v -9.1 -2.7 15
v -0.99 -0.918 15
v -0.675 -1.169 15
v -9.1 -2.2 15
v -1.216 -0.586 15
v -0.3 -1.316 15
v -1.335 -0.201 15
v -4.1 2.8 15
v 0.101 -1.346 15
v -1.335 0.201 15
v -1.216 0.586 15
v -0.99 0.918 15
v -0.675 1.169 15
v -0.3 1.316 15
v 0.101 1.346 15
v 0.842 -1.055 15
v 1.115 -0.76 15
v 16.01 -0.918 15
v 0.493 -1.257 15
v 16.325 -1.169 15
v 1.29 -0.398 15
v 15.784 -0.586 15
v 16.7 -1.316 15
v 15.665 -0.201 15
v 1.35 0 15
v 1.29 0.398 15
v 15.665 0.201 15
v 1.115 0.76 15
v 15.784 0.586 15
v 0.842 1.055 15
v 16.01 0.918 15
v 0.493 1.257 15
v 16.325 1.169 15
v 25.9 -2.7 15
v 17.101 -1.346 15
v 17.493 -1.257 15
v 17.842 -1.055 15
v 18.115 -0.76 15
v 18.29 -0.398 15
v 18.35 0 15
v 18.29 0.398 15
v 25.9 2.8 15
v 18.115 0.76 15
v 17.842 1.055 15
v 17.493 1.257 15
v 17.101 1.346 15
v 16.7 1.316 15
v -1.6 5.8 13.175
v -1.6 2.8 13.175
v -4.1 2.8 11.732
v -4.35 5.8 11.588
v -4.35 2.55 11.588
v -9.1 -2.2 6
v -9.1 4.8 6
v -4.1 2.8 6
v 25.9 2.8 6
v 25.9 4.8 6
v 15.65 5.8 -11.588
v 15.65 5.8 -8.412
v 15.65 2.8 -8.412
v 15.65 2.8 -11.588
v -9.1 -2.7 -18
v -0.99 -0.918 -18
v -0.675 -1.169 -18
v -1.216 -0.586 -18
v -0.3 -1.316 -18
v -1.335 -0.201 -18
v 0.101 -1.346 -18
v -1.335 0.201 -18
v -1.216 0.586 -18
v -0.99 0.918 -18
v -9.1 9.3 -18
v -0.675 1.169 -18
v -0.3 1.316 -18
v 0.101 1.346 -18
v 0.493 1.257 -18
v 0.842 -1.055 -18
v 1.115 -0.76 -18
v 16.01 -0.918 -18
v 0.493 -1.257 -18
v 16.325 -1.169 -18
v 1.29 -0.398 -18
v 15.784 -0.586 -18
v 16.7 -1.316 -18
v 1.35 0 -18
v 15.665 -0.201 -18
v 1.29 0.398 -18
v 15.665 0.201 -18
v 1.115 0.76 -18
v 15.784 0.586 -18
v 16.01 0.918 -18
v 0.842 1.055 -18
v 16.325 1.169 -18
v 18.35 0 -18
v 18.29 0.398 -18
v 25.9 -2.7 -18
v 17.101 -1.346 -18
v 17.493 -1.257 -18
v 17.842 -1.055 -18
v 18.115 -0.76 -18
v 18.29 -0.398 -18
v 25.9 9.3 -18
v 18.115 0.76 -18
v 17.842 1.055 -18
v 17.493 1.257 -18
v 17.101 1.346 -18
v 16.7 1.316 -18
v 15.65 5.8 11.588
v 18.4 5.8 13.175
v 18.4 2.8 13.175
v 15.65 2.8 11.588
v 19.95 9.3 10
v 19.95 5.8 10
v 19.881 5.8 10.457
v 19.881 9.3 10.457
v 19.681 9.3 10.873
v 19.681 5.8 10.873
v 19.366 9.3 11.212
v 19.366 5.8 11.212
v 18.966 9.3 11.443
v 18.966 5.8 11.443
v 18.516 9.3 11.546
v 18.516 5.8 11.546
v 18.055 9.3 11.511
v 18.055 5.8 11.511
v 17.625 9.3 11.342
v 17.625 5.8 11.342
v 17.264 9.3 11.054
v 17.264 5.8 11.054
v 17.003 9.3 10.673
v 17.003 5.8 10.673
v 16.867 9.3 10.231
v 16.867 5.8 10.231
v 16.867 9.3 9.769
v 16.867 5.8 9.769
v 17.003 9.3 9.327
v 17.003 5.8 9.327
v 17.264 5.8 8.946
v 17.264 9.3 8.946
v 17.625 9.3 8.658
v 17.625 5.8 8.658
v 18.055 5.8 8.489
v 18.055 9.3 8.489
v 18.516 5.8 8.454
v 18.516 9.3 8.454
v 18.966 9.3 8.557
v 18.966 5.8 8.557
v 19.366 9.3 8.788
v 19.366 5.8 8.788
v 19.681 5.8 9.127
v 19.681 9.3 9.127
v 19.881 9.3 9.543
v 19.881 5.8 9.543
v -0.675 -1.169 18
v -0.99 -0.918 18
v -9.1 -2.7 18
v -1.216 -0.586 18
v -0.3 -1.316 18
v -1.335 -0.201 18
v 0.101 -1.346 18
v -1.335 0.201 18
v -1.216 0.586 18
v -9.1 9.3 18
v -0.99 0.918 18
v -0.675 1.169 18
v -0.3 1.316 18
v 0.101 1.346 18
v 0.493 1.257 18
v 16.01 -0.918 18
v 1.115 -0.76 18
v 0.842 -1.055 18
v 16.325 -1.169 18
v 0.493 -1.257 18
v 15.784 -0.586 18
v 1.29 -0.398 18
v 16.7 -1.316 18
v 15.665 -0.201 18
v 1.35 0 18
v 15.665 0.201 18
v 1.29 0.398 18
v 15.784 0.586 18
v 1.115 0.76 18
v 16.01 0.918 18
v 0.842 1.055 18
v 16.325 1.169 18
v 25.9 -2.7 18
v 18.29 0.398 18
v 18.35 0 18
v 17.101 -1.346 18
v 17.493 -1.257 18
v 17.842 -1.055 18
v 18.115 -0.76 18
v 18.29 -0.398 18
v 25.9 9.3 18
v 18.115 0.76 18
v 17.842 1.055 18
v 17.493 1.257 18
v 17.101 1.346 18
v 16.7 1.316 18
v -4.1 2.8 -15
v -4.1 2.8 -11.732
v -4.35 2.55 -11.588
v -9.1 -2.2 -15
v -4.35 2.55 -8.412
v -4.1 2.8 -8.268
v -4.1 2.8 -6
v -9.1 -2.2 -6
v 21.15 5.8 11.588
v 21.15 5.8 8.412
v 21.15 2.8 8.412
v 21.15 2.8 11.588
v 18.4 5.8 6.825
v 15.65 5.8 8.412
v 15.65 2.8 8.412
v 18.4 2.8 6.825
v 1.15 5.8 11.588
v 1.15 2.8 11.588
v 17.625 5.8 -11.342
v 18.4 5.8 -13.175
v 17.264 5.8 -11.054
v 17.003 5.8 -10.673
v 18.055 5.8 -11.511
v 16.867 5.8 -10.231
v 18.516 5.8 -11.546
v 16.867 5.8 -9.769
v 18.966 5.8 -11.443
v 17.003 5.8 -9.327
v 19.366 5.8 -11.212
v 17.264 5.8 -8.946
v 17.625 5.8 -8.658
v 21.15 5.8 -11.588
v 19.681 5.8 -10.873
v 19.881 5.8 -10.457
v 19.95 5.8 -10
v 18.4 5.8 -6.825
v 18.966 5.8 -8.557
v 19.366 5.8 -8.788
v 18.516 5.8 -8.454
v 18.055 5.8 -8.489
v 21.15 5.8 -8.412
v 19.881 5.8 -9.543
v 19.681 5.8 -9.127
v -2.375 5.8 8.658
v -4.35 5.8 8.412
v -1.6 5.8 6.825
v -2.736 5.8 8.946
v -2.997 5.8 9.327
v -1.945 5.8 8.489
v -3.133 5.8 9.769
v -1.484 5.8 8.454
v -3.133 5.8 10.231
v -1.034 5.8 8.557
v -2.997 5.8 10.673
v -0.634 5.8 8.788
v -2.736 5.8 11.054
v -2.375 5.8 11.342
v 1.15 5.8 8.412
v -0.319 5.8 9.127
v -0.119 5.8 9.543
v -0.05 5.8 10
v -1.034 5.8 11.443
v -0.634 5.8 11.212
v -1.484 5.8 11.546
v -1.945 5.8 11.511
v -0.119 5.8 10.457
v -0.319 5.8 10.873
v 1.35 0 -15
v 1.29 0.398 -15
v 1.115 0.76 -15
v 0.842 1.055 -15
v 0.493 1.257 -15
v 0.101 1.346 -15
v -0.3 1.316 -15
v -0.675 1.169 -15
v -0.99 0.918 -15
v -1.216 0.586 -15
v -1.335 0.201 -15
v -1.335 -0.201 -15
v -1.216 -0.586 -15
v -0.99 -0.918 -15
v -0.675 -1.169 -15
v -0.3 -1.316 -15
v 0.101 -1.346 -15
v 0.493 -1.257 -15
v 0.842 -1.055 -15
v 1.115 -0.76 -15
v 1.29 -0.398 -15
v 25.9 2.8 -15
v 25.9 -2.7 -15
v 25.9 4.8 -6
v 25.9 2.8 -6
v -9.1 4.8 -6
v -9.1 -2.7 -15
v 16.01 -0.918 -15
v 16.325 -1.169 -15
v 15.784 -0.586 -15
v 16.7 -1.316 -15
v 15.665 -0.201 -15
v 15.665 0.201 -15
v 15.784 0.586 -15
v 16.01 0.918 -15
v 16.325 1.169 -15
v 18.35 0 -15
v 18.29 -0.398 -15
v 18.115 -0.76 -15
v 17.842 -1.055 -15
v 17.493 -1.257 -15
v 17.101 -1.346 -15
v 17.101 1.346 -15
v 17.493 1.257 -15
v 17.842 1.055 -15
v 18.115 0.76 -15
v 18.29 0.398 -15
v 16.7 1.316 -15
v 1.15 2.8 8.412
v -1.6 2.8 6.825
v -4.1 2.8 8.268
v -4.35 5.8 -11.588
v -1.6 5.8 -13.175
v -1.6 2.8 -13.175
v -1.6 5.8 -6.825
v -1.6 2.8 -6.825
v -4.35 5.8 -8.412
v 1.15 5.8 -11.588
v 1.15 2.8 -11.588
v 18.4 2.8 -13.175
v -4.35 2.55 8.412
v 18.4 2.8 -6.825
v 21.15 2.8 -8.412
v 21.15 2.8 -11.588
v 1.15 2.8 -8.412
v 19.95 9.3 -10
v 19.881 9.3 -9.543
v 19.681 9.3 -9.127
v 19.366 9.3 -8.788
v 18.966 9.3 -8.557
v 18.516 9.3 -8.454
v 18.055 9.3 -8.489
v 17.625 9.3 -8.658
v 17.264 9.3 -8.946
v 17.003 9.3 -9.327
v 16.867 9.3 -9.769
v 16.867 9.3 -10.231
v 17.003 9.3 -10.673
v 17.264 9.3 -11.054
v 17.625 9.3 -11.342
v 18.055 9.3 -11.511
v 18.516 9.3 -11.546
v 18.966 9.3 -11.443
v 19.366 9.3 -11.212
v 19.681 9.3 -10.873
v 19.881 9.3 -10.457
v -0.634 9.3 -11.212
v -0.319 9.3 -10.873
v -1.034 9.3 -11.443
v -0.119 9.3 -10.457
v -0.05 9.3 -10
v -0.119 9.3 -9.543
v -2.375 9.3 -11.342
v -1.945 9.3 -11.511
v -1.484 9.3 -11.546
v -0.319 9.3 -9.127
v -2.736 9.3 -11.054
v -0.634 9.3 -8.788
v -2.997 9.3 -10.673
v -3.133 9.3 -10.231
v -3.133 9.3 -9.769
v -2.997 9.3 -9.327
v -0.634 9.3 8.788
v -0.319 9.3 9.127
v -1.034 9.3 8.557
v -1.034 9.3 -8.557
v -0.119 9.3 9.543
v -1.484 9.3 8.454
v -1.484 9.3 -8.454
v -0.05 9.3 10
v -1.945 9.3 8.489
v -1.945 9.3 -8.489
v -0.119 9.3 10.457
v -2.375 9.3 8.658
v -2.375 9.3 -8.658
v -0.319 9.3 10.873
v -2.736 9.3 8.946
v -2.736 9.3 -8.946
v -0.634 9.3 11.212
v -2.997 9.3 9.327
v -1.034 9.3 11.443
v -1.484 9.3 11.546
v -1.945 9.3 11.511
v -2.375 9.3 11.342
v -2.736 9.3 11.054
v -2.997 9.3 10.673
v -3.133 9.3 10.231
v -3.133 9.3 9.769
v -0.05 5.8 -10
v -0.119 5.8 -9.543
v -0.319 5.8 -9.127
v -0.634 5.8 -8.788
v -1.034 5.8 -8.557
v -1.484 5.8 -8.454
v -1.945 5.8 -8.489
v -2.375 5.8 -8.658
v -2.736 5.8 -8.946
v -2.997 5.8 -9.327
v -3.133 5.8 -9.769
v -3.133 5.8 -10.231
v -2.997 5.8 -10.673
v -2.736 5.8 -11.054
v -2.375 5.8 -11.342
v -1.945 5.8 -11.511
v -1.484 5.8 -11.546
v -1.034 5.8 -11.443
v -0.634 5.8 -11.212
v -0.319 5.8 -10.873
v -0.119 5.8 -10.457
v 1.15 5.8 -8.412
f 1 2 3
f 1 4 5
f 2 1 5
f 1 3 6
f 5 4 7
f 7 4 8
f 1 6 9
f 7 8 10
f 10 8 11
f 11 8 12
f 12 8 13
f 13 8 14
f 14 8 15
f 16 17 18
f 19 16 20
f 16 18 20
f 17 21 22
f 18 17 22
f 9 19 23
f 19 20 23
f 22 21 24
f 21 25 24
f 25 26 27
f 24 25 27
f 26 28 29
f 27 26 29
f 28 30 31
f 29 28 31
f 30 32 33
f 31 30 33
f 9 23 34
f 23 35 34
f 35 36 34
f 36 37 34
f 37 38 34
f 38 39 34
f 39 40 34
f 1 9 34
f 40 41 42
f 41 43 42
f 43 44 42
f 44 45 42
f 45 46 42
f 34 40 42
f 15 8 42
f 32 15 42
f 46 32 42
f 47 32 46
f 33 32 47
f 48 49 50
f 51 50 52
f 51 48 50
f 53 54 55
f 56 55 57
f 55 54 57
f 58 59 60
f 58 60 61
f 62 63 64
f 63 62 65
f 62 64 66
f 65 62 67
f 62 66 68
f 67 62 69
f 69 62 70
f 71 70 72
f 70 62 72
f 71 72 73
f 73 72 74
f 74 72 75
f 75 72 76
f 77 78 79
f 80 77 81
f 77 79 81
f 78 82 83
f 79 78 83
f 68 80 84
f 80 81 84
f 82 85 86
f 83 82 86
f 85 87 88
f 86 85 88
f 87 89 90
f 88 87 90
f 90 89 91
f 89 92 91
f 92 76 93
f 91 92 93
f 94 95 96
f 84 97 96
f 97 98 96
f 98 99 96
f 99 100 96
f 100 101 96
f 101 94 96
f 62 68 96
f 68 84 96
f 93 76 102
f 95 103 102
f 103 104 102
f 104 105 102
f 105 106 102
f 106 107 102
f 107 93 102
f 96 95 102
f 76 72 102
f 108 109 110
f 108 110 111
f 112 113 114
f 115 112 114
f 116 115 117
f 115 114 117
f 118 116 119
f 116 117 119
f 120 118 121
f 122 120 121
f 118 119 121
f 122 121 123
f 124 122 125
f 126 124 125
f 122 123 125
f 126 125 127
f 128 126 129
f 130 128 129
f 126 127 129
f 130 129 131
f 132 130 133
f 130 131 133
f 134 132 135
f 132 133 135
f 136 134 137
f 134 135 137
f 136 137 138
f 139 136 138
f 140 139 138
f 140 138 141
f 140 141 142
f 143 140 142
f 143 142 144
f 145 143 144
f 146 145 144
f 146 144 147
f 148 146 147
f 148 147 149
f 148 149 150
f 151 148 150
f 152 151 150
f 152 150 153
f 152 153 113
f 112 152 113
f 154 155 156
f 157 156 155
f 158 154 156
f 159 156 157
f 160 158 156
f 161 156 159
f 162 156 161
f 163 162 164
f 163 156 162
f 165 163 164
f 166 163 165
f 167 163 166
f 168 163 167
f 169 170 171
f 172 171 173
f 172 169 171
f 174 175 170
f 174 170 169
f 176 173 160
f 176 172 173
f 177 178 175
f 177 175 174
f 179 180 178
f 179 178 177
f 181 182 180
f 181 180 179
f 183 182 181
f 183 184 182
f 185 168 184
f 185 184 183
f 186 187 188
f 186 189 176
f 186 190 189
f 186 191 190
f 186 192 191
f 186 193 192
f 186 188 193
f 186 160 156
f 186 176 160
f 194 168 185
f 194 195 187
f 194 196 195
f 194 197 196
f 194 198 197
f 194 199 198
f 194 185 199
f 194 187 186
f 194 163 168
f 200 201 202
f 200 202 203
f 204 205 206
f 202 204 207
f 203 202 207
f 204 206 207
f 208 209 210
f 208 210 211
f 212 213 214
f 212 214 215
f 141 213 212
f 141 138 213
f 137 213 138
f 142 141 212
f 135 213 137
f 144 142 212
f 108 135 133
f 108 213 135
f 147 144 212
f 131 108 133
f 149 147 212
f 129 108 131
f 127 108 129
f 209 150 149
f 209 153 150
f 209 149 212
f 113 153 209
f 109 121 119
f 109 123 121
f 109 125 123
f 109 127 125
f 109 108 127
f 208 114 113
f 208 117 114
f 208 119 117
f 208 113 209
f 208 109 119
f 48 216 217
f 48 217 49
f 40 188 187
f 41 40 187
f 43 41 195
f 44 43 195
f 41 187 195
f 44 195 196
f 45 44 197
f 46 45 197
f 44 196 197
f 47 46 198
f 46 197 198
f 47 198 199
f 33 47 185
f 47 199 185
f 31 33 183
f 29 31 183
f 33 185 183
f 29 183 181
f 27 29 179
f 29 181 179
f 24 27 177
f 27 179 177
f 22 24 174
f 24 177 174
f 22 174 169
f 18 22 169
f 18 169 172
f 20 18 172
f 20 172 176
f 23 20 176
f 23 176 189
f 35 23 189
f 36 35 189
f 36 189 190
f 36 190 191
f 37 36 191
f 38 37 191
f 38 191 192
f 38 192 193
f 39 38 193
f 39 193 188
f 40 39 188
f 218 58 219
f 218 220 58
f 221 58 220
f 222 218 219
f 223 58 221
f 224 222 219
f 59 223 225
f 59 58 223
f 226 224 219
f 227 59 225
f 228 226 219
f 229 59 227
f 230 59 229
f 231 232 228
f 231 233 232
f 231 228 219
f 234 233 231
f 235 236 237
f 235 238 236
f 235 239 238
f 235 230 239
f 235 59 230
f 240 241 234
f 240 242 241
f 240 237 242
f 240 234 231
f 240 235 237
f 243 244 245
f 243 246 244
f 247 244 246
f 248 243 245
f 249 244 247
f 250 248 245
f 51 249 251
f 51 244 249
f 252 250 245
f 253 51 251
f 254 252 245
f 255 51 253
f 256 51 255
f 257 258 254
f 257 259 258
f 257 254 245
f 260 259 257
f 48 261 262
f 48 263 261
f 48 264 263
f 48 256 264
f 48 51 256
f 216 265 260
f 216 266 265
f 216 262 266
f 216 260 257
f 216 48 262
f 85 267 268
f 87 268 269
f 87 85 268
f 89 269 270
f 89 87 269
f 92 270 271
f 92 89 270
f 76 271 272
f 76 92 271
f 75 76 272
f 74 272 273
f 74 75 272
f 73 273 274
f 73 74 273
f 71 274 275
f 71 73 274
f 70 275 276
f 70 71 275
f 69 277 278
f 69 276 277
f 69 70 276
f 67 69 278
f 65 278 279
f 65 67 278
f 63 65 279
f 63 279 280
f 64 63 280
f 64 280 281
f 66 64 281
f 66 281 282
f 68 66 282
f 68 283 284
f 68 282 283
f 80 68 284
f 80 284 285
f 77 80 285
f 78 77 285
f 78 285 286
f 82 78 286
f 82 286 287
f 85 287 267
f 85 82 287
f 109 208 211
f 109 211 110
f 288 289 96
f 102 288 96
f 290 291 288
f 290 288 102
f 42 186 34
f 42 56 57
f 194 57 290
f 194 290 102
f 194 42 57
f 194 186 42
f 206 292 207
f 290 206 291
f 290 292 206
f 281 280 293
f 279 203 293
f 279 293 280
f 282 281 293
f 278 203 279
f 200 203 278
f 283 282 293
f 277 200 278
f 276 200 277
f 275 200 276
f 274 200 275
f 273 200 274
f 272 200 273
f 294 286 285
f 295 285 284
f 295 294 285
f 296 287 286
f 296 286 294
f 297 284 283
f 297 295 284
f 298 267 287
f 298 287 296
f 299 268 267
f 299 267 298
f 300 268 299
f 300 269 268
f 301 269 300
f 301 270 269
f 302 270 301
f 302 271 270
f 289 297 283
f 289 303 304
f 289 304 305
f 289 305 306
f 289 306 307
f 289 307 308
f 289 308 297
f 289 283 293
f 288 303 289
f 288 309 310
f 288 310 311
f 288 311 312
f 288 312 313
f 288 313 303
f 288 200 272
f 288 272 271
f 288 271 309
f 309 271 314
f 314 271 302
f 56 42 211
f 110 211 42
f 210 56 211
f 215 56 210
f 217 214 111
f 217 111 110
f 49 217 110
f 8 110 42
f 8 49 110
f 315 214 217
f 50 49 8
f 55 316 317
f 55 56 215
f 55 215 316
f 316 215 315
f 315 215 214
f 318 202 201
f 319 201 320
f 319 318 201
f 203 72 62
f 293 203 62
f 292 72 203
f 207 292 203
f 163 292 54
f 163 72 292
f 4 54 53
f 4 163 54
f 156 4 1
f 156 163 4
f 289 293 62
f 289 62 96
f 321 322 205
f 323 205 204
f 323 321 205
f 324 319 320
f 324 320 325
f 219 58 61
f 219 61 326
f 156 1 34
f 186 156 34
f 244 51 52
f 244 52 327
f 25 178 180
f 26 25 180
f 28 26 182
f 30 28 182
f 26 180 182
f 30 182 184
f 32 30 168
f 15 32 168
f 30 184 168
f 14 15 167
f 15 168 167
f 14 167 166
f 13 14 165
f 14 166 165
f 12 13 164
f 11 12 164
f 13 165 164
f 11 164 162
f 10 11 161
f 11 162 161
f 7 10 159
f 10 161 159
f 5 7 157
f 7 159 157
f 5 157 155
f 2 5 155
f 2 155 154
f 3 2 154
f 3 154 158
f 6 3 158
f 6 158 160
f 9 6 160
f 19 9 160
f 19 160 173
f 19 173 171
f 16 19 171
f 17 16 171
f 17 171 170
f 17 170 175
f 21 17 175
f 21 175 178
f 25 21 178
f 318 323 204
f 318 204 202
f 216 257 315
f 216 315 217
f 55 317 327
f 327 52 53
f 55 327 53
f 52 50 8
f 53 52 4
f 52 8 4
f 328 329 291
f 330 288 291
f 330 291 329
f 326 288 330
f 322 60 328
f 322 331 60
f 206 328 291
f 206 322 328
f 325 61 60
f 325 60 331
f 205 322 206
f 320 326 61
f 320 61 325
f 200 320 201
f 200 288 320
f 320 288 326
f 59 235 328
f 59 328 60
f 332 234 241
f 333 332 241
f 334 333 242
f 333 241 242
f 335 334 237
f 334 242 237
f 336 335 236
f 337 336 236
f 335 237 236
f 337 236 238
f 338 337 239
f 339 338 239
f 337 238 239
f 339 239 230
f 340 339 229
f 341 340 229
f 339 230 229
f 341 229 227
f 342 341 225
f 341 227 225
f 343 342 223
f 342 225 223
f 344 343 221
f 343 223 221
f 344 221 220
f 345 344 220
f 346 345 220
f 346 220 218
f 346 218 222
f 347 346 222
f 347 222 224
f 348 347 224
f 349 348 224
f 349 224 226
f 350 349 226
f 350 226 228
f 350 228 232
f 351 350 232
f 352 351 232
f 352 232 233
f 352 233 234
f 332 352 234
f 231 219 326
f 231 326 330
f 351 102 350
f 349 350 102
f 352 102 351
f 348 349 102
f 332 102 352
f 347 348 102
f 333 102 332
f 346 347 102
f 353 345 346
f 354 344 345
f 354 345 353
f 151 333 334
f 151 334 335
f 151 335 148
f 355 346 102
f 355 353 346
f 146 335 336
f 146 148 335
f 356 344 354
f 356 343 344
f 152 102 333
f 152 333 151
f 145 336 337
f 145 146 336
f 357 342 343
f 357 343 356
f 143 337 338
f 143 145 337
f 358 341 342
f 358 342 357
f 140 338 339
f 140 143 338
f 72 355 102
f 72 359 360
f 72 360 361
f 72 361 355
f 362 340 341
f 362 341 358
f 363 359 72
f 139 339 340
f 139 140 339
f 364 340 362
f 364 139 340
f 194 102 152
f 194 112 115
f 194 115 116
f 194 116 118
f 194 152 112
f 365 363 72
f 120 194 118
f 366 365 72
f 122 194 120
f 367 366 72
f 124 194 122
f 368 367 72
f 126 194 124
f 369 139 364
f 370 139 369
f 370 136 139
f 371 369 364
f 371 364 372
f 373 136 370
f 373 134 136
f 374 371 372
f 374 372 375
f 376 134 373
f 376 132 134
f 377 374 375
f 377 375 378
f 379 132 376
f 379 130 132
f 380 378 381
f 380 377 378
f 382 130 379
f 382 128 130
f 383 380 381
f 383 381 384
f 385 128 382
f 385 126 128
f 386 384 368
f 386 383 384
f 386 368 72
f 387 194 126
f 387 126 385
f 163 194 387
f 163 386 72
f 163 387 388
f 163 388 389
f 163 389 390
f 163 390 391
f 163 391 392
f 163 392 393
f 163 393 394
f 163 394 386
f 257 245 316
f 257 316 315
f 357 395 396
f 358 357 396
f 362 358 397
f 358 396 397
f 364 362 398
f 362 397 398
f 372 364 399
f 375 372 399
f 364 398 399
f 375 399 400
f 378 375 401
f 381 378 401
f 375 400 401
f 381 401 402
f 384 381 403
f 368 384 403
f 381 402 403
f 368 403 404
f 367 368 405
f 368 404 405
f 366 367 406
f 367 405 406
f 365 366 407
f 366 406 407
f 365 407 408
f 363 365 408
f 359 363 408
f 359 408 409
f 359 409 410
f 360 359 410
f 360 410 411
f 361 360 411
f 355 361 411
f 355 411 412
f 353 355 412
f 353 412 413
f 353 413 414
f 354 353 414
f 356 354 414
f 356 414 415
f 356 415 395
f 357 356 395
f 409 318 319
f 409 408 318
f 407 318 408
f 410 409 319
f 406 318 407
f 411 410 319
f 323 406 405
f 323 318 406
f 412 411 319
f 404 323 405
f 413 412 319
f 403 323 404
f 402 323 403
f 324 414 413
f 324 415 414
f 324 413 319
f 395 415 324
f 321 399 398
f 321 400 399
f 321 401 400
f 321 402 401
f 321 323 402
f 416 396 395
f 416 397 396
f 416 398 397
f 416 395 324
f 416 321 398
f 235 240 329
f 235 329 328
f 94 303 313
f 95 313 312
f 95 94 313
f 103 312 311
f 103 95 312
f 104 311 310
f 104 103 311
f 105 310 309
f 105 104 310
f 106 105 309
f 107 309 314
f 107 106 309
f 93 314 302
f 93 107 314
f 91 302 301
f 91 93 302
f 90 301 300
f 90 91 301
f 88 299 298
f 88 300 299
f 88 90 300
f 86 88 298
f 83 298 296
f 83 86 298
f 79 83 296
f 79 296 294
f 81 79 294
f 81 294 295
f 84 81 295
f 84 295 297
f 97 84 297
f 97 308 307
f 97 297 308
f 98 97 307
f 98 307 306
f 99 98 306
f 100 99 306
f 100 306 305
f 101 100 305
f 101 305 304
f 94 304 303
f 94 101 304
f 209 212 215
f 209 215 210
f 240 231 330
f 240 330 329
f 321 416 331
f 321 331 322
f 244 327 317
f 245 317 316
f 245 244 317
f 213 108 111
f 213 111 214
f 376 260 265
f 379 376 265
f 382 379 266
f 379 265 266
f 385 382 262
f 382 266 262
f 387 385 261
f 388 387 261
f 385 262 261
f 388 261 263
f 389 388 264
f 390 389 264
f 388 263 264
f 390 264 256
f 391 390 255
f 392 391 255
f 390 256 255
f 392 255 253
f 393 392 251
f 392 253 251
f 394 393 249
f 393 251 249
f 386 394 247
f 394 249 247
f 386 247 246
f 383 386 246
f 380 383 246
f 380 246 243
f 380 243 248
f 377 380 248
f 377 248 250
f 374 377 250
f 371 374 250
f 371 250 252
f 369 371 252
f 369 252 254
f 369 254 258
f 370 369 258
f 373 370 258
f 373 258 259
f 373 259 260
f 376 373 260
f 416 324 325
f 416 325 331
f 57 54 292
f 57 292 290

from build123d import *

# Parameters (mm, degrees)
BOSS_EXTRUDE1_DEPTH        = 18
CROQUIS2_R                 = 1.35
CORTAR_EXTRUIR2_DEPTH      = 5
CORTAR_EXTRUIR3_START      = 3
CORTAR_EXTRUIR3_DEPTH      = 17
CORTAR_EXTRUIR4_DEPTH      = 33.203415968
CORTAR_EXTRUIR4_DEPTH_BACK = 2
CROQUIS4_W                 = 70
CROQUIS4_H                 = 12
CORTAR_EXTRUIR5_DEPTH      = 2.5
CORTAR_EXTRUIR5_DEPTH_BACK = 3
CROQUIS7_R                 = 0.161098749
CROQUIS7_R_2               = 1.55
CORTAR_EXTRUIR6_DEPTH      = 33.203415968


with BuildPart() as part:
    # Sketch1 → Boss-Extrude1 (new body)
    with BuildSketch(Plane.XY):
        Polygon((25.9, 9.3), (-9.1, 9.3), (-9.1, 2.5), (-9.1, -2.7), (25.9, -2.7), (25.9, 2.5), align=None)
    boss_extrude1 = extrude(amount=BOSS_EXTRUDE1_DEPTH)

    # Croquis2 → Cortar-Extruir2 (cut)
    with BuildSketch(Plane.XY.offset(18)):
        Circle(CROQUIS2_R)
        with Locations((17, 0)):
            Circle(CROQUIS2_R)
    cortar_extruir2 = extrude(amount=-CORTAR_EXTRUIR2_DEPTH, mode=Mode.SUBTRACT)

    # Croquis3 → Cortar-Extruir3 (cut)
    with BuildSketch(Plane(origin=(0, 0, 18), x_dir=(-1, 0, 0), z_dir=(0, 0, -1)).offset(CORTAR_EXTRUIR3_START)):
        Polygon((-25.9, -2.7), (-25.9, 2.8), (4.1, 2.8), (9.1, -2.2), (9.1, -2.7), align=None)
    cortar_extruir3 = extrude(amount=CORTAR_EXTRUIR3_DEPTH, mode=Mode.SUBTRACT)

    # Mirror1: Boss-Extrude1, Cortar-Extruir2, Cortar-Extruir3 across plane
    add(boss_extrude1.mirror(Plane.XY))
    add(cortar_extruir2.mirror(Plane.XY), mode=Mode.SUBTRACT)
    add(cortar_extruir3.mirror(Plane.XY), mode=Mode.SUBTRACT)

    # Croquis4 → Cortar-Extruir4 (cut, two sides: drawn at the far end of the back side and taken through both)
    with BuildSketch(Plane.XZ.offset(-2.8).offset(-CORTAR_EXTRUIR4_DEPTH_BACK)):
        with Locations((-9.1, 0)):
            Rectangle(CROQUIS4_W, CROQUIS4_H)
    extrude(amount=CORTAR_EXTRUIR4_DEPTH + CORTAR_EXTRUIR4_DEPTH_BACK, mode=Mode.SUBTRACT)

    # Croquis5 → Cortar-Extruir5 (cut, two sides: drawn at the far end of the back side and taken through both)
    with BuildSketch(Plane.XZ.offset(-2.8).offset(-CORTAR_EXTRUIR5_DEPTH_BACK)):
        Polygon((-1.6, 13.175426481), (-4.35, 11.58771324), (-4.35, 8.41228676), (-1.6, 6.824573519), (1.15, 8.41228676), (1.15, 11.58771324), align=None)
        Polygon((18.4, 13.175426481), (15.65, 11.58771324), (15.65, 8.41228676), (18.4, 6.824573519), (21.15, 8.41228676), (21.15, 11.58771324), align=None)
        Polygon((-1.6, -6.824573519), (-4.35, -8.41228676), (-4.35, -11.58771324), (-1.6, -13.175426481), (1.15, -11.58771324), (1.15, -8.41228676), align=None)
        Polygon((18.4, -6.824573519), (15.65, -8.41228676), (15.65, -11.58771324), (18.4, -13.175426481), (21.15, -11.58771324), (21.15, -8.41228676), align=None)
    extrude(amount=CORTAR_EXTRUIR5_DEPTH + CORTAR_EXTRUIR5_DEPTH_BACK, mode=Mode.SUBTRACT)

    # Croquis7 → Cortar-Extruir6 (cut, through all)
    with BuildSketch(Plane.XZ.offset(-2.8)):
        with Locations((-69.565345843, 7.024441215)):
            Circle(CROQUIS7_R)
        with Locations((-1.6, 10)):
            Circle(CROQUIS7_R_2)
        with Locations((18.4, 10)):
            Circle(CROQUIS7_R_2)
        with Locations((18.4, -10)):
            Circle(CROQUIS7_R_2)
        with Locations((-1.6, -10)):
            Circle(CROQUIS7_R_2)
    extrude(amount=-CORTAR_EXTRUIR6_DEPTH, mode=Mode.SUBTRACT)


solid = part.part
